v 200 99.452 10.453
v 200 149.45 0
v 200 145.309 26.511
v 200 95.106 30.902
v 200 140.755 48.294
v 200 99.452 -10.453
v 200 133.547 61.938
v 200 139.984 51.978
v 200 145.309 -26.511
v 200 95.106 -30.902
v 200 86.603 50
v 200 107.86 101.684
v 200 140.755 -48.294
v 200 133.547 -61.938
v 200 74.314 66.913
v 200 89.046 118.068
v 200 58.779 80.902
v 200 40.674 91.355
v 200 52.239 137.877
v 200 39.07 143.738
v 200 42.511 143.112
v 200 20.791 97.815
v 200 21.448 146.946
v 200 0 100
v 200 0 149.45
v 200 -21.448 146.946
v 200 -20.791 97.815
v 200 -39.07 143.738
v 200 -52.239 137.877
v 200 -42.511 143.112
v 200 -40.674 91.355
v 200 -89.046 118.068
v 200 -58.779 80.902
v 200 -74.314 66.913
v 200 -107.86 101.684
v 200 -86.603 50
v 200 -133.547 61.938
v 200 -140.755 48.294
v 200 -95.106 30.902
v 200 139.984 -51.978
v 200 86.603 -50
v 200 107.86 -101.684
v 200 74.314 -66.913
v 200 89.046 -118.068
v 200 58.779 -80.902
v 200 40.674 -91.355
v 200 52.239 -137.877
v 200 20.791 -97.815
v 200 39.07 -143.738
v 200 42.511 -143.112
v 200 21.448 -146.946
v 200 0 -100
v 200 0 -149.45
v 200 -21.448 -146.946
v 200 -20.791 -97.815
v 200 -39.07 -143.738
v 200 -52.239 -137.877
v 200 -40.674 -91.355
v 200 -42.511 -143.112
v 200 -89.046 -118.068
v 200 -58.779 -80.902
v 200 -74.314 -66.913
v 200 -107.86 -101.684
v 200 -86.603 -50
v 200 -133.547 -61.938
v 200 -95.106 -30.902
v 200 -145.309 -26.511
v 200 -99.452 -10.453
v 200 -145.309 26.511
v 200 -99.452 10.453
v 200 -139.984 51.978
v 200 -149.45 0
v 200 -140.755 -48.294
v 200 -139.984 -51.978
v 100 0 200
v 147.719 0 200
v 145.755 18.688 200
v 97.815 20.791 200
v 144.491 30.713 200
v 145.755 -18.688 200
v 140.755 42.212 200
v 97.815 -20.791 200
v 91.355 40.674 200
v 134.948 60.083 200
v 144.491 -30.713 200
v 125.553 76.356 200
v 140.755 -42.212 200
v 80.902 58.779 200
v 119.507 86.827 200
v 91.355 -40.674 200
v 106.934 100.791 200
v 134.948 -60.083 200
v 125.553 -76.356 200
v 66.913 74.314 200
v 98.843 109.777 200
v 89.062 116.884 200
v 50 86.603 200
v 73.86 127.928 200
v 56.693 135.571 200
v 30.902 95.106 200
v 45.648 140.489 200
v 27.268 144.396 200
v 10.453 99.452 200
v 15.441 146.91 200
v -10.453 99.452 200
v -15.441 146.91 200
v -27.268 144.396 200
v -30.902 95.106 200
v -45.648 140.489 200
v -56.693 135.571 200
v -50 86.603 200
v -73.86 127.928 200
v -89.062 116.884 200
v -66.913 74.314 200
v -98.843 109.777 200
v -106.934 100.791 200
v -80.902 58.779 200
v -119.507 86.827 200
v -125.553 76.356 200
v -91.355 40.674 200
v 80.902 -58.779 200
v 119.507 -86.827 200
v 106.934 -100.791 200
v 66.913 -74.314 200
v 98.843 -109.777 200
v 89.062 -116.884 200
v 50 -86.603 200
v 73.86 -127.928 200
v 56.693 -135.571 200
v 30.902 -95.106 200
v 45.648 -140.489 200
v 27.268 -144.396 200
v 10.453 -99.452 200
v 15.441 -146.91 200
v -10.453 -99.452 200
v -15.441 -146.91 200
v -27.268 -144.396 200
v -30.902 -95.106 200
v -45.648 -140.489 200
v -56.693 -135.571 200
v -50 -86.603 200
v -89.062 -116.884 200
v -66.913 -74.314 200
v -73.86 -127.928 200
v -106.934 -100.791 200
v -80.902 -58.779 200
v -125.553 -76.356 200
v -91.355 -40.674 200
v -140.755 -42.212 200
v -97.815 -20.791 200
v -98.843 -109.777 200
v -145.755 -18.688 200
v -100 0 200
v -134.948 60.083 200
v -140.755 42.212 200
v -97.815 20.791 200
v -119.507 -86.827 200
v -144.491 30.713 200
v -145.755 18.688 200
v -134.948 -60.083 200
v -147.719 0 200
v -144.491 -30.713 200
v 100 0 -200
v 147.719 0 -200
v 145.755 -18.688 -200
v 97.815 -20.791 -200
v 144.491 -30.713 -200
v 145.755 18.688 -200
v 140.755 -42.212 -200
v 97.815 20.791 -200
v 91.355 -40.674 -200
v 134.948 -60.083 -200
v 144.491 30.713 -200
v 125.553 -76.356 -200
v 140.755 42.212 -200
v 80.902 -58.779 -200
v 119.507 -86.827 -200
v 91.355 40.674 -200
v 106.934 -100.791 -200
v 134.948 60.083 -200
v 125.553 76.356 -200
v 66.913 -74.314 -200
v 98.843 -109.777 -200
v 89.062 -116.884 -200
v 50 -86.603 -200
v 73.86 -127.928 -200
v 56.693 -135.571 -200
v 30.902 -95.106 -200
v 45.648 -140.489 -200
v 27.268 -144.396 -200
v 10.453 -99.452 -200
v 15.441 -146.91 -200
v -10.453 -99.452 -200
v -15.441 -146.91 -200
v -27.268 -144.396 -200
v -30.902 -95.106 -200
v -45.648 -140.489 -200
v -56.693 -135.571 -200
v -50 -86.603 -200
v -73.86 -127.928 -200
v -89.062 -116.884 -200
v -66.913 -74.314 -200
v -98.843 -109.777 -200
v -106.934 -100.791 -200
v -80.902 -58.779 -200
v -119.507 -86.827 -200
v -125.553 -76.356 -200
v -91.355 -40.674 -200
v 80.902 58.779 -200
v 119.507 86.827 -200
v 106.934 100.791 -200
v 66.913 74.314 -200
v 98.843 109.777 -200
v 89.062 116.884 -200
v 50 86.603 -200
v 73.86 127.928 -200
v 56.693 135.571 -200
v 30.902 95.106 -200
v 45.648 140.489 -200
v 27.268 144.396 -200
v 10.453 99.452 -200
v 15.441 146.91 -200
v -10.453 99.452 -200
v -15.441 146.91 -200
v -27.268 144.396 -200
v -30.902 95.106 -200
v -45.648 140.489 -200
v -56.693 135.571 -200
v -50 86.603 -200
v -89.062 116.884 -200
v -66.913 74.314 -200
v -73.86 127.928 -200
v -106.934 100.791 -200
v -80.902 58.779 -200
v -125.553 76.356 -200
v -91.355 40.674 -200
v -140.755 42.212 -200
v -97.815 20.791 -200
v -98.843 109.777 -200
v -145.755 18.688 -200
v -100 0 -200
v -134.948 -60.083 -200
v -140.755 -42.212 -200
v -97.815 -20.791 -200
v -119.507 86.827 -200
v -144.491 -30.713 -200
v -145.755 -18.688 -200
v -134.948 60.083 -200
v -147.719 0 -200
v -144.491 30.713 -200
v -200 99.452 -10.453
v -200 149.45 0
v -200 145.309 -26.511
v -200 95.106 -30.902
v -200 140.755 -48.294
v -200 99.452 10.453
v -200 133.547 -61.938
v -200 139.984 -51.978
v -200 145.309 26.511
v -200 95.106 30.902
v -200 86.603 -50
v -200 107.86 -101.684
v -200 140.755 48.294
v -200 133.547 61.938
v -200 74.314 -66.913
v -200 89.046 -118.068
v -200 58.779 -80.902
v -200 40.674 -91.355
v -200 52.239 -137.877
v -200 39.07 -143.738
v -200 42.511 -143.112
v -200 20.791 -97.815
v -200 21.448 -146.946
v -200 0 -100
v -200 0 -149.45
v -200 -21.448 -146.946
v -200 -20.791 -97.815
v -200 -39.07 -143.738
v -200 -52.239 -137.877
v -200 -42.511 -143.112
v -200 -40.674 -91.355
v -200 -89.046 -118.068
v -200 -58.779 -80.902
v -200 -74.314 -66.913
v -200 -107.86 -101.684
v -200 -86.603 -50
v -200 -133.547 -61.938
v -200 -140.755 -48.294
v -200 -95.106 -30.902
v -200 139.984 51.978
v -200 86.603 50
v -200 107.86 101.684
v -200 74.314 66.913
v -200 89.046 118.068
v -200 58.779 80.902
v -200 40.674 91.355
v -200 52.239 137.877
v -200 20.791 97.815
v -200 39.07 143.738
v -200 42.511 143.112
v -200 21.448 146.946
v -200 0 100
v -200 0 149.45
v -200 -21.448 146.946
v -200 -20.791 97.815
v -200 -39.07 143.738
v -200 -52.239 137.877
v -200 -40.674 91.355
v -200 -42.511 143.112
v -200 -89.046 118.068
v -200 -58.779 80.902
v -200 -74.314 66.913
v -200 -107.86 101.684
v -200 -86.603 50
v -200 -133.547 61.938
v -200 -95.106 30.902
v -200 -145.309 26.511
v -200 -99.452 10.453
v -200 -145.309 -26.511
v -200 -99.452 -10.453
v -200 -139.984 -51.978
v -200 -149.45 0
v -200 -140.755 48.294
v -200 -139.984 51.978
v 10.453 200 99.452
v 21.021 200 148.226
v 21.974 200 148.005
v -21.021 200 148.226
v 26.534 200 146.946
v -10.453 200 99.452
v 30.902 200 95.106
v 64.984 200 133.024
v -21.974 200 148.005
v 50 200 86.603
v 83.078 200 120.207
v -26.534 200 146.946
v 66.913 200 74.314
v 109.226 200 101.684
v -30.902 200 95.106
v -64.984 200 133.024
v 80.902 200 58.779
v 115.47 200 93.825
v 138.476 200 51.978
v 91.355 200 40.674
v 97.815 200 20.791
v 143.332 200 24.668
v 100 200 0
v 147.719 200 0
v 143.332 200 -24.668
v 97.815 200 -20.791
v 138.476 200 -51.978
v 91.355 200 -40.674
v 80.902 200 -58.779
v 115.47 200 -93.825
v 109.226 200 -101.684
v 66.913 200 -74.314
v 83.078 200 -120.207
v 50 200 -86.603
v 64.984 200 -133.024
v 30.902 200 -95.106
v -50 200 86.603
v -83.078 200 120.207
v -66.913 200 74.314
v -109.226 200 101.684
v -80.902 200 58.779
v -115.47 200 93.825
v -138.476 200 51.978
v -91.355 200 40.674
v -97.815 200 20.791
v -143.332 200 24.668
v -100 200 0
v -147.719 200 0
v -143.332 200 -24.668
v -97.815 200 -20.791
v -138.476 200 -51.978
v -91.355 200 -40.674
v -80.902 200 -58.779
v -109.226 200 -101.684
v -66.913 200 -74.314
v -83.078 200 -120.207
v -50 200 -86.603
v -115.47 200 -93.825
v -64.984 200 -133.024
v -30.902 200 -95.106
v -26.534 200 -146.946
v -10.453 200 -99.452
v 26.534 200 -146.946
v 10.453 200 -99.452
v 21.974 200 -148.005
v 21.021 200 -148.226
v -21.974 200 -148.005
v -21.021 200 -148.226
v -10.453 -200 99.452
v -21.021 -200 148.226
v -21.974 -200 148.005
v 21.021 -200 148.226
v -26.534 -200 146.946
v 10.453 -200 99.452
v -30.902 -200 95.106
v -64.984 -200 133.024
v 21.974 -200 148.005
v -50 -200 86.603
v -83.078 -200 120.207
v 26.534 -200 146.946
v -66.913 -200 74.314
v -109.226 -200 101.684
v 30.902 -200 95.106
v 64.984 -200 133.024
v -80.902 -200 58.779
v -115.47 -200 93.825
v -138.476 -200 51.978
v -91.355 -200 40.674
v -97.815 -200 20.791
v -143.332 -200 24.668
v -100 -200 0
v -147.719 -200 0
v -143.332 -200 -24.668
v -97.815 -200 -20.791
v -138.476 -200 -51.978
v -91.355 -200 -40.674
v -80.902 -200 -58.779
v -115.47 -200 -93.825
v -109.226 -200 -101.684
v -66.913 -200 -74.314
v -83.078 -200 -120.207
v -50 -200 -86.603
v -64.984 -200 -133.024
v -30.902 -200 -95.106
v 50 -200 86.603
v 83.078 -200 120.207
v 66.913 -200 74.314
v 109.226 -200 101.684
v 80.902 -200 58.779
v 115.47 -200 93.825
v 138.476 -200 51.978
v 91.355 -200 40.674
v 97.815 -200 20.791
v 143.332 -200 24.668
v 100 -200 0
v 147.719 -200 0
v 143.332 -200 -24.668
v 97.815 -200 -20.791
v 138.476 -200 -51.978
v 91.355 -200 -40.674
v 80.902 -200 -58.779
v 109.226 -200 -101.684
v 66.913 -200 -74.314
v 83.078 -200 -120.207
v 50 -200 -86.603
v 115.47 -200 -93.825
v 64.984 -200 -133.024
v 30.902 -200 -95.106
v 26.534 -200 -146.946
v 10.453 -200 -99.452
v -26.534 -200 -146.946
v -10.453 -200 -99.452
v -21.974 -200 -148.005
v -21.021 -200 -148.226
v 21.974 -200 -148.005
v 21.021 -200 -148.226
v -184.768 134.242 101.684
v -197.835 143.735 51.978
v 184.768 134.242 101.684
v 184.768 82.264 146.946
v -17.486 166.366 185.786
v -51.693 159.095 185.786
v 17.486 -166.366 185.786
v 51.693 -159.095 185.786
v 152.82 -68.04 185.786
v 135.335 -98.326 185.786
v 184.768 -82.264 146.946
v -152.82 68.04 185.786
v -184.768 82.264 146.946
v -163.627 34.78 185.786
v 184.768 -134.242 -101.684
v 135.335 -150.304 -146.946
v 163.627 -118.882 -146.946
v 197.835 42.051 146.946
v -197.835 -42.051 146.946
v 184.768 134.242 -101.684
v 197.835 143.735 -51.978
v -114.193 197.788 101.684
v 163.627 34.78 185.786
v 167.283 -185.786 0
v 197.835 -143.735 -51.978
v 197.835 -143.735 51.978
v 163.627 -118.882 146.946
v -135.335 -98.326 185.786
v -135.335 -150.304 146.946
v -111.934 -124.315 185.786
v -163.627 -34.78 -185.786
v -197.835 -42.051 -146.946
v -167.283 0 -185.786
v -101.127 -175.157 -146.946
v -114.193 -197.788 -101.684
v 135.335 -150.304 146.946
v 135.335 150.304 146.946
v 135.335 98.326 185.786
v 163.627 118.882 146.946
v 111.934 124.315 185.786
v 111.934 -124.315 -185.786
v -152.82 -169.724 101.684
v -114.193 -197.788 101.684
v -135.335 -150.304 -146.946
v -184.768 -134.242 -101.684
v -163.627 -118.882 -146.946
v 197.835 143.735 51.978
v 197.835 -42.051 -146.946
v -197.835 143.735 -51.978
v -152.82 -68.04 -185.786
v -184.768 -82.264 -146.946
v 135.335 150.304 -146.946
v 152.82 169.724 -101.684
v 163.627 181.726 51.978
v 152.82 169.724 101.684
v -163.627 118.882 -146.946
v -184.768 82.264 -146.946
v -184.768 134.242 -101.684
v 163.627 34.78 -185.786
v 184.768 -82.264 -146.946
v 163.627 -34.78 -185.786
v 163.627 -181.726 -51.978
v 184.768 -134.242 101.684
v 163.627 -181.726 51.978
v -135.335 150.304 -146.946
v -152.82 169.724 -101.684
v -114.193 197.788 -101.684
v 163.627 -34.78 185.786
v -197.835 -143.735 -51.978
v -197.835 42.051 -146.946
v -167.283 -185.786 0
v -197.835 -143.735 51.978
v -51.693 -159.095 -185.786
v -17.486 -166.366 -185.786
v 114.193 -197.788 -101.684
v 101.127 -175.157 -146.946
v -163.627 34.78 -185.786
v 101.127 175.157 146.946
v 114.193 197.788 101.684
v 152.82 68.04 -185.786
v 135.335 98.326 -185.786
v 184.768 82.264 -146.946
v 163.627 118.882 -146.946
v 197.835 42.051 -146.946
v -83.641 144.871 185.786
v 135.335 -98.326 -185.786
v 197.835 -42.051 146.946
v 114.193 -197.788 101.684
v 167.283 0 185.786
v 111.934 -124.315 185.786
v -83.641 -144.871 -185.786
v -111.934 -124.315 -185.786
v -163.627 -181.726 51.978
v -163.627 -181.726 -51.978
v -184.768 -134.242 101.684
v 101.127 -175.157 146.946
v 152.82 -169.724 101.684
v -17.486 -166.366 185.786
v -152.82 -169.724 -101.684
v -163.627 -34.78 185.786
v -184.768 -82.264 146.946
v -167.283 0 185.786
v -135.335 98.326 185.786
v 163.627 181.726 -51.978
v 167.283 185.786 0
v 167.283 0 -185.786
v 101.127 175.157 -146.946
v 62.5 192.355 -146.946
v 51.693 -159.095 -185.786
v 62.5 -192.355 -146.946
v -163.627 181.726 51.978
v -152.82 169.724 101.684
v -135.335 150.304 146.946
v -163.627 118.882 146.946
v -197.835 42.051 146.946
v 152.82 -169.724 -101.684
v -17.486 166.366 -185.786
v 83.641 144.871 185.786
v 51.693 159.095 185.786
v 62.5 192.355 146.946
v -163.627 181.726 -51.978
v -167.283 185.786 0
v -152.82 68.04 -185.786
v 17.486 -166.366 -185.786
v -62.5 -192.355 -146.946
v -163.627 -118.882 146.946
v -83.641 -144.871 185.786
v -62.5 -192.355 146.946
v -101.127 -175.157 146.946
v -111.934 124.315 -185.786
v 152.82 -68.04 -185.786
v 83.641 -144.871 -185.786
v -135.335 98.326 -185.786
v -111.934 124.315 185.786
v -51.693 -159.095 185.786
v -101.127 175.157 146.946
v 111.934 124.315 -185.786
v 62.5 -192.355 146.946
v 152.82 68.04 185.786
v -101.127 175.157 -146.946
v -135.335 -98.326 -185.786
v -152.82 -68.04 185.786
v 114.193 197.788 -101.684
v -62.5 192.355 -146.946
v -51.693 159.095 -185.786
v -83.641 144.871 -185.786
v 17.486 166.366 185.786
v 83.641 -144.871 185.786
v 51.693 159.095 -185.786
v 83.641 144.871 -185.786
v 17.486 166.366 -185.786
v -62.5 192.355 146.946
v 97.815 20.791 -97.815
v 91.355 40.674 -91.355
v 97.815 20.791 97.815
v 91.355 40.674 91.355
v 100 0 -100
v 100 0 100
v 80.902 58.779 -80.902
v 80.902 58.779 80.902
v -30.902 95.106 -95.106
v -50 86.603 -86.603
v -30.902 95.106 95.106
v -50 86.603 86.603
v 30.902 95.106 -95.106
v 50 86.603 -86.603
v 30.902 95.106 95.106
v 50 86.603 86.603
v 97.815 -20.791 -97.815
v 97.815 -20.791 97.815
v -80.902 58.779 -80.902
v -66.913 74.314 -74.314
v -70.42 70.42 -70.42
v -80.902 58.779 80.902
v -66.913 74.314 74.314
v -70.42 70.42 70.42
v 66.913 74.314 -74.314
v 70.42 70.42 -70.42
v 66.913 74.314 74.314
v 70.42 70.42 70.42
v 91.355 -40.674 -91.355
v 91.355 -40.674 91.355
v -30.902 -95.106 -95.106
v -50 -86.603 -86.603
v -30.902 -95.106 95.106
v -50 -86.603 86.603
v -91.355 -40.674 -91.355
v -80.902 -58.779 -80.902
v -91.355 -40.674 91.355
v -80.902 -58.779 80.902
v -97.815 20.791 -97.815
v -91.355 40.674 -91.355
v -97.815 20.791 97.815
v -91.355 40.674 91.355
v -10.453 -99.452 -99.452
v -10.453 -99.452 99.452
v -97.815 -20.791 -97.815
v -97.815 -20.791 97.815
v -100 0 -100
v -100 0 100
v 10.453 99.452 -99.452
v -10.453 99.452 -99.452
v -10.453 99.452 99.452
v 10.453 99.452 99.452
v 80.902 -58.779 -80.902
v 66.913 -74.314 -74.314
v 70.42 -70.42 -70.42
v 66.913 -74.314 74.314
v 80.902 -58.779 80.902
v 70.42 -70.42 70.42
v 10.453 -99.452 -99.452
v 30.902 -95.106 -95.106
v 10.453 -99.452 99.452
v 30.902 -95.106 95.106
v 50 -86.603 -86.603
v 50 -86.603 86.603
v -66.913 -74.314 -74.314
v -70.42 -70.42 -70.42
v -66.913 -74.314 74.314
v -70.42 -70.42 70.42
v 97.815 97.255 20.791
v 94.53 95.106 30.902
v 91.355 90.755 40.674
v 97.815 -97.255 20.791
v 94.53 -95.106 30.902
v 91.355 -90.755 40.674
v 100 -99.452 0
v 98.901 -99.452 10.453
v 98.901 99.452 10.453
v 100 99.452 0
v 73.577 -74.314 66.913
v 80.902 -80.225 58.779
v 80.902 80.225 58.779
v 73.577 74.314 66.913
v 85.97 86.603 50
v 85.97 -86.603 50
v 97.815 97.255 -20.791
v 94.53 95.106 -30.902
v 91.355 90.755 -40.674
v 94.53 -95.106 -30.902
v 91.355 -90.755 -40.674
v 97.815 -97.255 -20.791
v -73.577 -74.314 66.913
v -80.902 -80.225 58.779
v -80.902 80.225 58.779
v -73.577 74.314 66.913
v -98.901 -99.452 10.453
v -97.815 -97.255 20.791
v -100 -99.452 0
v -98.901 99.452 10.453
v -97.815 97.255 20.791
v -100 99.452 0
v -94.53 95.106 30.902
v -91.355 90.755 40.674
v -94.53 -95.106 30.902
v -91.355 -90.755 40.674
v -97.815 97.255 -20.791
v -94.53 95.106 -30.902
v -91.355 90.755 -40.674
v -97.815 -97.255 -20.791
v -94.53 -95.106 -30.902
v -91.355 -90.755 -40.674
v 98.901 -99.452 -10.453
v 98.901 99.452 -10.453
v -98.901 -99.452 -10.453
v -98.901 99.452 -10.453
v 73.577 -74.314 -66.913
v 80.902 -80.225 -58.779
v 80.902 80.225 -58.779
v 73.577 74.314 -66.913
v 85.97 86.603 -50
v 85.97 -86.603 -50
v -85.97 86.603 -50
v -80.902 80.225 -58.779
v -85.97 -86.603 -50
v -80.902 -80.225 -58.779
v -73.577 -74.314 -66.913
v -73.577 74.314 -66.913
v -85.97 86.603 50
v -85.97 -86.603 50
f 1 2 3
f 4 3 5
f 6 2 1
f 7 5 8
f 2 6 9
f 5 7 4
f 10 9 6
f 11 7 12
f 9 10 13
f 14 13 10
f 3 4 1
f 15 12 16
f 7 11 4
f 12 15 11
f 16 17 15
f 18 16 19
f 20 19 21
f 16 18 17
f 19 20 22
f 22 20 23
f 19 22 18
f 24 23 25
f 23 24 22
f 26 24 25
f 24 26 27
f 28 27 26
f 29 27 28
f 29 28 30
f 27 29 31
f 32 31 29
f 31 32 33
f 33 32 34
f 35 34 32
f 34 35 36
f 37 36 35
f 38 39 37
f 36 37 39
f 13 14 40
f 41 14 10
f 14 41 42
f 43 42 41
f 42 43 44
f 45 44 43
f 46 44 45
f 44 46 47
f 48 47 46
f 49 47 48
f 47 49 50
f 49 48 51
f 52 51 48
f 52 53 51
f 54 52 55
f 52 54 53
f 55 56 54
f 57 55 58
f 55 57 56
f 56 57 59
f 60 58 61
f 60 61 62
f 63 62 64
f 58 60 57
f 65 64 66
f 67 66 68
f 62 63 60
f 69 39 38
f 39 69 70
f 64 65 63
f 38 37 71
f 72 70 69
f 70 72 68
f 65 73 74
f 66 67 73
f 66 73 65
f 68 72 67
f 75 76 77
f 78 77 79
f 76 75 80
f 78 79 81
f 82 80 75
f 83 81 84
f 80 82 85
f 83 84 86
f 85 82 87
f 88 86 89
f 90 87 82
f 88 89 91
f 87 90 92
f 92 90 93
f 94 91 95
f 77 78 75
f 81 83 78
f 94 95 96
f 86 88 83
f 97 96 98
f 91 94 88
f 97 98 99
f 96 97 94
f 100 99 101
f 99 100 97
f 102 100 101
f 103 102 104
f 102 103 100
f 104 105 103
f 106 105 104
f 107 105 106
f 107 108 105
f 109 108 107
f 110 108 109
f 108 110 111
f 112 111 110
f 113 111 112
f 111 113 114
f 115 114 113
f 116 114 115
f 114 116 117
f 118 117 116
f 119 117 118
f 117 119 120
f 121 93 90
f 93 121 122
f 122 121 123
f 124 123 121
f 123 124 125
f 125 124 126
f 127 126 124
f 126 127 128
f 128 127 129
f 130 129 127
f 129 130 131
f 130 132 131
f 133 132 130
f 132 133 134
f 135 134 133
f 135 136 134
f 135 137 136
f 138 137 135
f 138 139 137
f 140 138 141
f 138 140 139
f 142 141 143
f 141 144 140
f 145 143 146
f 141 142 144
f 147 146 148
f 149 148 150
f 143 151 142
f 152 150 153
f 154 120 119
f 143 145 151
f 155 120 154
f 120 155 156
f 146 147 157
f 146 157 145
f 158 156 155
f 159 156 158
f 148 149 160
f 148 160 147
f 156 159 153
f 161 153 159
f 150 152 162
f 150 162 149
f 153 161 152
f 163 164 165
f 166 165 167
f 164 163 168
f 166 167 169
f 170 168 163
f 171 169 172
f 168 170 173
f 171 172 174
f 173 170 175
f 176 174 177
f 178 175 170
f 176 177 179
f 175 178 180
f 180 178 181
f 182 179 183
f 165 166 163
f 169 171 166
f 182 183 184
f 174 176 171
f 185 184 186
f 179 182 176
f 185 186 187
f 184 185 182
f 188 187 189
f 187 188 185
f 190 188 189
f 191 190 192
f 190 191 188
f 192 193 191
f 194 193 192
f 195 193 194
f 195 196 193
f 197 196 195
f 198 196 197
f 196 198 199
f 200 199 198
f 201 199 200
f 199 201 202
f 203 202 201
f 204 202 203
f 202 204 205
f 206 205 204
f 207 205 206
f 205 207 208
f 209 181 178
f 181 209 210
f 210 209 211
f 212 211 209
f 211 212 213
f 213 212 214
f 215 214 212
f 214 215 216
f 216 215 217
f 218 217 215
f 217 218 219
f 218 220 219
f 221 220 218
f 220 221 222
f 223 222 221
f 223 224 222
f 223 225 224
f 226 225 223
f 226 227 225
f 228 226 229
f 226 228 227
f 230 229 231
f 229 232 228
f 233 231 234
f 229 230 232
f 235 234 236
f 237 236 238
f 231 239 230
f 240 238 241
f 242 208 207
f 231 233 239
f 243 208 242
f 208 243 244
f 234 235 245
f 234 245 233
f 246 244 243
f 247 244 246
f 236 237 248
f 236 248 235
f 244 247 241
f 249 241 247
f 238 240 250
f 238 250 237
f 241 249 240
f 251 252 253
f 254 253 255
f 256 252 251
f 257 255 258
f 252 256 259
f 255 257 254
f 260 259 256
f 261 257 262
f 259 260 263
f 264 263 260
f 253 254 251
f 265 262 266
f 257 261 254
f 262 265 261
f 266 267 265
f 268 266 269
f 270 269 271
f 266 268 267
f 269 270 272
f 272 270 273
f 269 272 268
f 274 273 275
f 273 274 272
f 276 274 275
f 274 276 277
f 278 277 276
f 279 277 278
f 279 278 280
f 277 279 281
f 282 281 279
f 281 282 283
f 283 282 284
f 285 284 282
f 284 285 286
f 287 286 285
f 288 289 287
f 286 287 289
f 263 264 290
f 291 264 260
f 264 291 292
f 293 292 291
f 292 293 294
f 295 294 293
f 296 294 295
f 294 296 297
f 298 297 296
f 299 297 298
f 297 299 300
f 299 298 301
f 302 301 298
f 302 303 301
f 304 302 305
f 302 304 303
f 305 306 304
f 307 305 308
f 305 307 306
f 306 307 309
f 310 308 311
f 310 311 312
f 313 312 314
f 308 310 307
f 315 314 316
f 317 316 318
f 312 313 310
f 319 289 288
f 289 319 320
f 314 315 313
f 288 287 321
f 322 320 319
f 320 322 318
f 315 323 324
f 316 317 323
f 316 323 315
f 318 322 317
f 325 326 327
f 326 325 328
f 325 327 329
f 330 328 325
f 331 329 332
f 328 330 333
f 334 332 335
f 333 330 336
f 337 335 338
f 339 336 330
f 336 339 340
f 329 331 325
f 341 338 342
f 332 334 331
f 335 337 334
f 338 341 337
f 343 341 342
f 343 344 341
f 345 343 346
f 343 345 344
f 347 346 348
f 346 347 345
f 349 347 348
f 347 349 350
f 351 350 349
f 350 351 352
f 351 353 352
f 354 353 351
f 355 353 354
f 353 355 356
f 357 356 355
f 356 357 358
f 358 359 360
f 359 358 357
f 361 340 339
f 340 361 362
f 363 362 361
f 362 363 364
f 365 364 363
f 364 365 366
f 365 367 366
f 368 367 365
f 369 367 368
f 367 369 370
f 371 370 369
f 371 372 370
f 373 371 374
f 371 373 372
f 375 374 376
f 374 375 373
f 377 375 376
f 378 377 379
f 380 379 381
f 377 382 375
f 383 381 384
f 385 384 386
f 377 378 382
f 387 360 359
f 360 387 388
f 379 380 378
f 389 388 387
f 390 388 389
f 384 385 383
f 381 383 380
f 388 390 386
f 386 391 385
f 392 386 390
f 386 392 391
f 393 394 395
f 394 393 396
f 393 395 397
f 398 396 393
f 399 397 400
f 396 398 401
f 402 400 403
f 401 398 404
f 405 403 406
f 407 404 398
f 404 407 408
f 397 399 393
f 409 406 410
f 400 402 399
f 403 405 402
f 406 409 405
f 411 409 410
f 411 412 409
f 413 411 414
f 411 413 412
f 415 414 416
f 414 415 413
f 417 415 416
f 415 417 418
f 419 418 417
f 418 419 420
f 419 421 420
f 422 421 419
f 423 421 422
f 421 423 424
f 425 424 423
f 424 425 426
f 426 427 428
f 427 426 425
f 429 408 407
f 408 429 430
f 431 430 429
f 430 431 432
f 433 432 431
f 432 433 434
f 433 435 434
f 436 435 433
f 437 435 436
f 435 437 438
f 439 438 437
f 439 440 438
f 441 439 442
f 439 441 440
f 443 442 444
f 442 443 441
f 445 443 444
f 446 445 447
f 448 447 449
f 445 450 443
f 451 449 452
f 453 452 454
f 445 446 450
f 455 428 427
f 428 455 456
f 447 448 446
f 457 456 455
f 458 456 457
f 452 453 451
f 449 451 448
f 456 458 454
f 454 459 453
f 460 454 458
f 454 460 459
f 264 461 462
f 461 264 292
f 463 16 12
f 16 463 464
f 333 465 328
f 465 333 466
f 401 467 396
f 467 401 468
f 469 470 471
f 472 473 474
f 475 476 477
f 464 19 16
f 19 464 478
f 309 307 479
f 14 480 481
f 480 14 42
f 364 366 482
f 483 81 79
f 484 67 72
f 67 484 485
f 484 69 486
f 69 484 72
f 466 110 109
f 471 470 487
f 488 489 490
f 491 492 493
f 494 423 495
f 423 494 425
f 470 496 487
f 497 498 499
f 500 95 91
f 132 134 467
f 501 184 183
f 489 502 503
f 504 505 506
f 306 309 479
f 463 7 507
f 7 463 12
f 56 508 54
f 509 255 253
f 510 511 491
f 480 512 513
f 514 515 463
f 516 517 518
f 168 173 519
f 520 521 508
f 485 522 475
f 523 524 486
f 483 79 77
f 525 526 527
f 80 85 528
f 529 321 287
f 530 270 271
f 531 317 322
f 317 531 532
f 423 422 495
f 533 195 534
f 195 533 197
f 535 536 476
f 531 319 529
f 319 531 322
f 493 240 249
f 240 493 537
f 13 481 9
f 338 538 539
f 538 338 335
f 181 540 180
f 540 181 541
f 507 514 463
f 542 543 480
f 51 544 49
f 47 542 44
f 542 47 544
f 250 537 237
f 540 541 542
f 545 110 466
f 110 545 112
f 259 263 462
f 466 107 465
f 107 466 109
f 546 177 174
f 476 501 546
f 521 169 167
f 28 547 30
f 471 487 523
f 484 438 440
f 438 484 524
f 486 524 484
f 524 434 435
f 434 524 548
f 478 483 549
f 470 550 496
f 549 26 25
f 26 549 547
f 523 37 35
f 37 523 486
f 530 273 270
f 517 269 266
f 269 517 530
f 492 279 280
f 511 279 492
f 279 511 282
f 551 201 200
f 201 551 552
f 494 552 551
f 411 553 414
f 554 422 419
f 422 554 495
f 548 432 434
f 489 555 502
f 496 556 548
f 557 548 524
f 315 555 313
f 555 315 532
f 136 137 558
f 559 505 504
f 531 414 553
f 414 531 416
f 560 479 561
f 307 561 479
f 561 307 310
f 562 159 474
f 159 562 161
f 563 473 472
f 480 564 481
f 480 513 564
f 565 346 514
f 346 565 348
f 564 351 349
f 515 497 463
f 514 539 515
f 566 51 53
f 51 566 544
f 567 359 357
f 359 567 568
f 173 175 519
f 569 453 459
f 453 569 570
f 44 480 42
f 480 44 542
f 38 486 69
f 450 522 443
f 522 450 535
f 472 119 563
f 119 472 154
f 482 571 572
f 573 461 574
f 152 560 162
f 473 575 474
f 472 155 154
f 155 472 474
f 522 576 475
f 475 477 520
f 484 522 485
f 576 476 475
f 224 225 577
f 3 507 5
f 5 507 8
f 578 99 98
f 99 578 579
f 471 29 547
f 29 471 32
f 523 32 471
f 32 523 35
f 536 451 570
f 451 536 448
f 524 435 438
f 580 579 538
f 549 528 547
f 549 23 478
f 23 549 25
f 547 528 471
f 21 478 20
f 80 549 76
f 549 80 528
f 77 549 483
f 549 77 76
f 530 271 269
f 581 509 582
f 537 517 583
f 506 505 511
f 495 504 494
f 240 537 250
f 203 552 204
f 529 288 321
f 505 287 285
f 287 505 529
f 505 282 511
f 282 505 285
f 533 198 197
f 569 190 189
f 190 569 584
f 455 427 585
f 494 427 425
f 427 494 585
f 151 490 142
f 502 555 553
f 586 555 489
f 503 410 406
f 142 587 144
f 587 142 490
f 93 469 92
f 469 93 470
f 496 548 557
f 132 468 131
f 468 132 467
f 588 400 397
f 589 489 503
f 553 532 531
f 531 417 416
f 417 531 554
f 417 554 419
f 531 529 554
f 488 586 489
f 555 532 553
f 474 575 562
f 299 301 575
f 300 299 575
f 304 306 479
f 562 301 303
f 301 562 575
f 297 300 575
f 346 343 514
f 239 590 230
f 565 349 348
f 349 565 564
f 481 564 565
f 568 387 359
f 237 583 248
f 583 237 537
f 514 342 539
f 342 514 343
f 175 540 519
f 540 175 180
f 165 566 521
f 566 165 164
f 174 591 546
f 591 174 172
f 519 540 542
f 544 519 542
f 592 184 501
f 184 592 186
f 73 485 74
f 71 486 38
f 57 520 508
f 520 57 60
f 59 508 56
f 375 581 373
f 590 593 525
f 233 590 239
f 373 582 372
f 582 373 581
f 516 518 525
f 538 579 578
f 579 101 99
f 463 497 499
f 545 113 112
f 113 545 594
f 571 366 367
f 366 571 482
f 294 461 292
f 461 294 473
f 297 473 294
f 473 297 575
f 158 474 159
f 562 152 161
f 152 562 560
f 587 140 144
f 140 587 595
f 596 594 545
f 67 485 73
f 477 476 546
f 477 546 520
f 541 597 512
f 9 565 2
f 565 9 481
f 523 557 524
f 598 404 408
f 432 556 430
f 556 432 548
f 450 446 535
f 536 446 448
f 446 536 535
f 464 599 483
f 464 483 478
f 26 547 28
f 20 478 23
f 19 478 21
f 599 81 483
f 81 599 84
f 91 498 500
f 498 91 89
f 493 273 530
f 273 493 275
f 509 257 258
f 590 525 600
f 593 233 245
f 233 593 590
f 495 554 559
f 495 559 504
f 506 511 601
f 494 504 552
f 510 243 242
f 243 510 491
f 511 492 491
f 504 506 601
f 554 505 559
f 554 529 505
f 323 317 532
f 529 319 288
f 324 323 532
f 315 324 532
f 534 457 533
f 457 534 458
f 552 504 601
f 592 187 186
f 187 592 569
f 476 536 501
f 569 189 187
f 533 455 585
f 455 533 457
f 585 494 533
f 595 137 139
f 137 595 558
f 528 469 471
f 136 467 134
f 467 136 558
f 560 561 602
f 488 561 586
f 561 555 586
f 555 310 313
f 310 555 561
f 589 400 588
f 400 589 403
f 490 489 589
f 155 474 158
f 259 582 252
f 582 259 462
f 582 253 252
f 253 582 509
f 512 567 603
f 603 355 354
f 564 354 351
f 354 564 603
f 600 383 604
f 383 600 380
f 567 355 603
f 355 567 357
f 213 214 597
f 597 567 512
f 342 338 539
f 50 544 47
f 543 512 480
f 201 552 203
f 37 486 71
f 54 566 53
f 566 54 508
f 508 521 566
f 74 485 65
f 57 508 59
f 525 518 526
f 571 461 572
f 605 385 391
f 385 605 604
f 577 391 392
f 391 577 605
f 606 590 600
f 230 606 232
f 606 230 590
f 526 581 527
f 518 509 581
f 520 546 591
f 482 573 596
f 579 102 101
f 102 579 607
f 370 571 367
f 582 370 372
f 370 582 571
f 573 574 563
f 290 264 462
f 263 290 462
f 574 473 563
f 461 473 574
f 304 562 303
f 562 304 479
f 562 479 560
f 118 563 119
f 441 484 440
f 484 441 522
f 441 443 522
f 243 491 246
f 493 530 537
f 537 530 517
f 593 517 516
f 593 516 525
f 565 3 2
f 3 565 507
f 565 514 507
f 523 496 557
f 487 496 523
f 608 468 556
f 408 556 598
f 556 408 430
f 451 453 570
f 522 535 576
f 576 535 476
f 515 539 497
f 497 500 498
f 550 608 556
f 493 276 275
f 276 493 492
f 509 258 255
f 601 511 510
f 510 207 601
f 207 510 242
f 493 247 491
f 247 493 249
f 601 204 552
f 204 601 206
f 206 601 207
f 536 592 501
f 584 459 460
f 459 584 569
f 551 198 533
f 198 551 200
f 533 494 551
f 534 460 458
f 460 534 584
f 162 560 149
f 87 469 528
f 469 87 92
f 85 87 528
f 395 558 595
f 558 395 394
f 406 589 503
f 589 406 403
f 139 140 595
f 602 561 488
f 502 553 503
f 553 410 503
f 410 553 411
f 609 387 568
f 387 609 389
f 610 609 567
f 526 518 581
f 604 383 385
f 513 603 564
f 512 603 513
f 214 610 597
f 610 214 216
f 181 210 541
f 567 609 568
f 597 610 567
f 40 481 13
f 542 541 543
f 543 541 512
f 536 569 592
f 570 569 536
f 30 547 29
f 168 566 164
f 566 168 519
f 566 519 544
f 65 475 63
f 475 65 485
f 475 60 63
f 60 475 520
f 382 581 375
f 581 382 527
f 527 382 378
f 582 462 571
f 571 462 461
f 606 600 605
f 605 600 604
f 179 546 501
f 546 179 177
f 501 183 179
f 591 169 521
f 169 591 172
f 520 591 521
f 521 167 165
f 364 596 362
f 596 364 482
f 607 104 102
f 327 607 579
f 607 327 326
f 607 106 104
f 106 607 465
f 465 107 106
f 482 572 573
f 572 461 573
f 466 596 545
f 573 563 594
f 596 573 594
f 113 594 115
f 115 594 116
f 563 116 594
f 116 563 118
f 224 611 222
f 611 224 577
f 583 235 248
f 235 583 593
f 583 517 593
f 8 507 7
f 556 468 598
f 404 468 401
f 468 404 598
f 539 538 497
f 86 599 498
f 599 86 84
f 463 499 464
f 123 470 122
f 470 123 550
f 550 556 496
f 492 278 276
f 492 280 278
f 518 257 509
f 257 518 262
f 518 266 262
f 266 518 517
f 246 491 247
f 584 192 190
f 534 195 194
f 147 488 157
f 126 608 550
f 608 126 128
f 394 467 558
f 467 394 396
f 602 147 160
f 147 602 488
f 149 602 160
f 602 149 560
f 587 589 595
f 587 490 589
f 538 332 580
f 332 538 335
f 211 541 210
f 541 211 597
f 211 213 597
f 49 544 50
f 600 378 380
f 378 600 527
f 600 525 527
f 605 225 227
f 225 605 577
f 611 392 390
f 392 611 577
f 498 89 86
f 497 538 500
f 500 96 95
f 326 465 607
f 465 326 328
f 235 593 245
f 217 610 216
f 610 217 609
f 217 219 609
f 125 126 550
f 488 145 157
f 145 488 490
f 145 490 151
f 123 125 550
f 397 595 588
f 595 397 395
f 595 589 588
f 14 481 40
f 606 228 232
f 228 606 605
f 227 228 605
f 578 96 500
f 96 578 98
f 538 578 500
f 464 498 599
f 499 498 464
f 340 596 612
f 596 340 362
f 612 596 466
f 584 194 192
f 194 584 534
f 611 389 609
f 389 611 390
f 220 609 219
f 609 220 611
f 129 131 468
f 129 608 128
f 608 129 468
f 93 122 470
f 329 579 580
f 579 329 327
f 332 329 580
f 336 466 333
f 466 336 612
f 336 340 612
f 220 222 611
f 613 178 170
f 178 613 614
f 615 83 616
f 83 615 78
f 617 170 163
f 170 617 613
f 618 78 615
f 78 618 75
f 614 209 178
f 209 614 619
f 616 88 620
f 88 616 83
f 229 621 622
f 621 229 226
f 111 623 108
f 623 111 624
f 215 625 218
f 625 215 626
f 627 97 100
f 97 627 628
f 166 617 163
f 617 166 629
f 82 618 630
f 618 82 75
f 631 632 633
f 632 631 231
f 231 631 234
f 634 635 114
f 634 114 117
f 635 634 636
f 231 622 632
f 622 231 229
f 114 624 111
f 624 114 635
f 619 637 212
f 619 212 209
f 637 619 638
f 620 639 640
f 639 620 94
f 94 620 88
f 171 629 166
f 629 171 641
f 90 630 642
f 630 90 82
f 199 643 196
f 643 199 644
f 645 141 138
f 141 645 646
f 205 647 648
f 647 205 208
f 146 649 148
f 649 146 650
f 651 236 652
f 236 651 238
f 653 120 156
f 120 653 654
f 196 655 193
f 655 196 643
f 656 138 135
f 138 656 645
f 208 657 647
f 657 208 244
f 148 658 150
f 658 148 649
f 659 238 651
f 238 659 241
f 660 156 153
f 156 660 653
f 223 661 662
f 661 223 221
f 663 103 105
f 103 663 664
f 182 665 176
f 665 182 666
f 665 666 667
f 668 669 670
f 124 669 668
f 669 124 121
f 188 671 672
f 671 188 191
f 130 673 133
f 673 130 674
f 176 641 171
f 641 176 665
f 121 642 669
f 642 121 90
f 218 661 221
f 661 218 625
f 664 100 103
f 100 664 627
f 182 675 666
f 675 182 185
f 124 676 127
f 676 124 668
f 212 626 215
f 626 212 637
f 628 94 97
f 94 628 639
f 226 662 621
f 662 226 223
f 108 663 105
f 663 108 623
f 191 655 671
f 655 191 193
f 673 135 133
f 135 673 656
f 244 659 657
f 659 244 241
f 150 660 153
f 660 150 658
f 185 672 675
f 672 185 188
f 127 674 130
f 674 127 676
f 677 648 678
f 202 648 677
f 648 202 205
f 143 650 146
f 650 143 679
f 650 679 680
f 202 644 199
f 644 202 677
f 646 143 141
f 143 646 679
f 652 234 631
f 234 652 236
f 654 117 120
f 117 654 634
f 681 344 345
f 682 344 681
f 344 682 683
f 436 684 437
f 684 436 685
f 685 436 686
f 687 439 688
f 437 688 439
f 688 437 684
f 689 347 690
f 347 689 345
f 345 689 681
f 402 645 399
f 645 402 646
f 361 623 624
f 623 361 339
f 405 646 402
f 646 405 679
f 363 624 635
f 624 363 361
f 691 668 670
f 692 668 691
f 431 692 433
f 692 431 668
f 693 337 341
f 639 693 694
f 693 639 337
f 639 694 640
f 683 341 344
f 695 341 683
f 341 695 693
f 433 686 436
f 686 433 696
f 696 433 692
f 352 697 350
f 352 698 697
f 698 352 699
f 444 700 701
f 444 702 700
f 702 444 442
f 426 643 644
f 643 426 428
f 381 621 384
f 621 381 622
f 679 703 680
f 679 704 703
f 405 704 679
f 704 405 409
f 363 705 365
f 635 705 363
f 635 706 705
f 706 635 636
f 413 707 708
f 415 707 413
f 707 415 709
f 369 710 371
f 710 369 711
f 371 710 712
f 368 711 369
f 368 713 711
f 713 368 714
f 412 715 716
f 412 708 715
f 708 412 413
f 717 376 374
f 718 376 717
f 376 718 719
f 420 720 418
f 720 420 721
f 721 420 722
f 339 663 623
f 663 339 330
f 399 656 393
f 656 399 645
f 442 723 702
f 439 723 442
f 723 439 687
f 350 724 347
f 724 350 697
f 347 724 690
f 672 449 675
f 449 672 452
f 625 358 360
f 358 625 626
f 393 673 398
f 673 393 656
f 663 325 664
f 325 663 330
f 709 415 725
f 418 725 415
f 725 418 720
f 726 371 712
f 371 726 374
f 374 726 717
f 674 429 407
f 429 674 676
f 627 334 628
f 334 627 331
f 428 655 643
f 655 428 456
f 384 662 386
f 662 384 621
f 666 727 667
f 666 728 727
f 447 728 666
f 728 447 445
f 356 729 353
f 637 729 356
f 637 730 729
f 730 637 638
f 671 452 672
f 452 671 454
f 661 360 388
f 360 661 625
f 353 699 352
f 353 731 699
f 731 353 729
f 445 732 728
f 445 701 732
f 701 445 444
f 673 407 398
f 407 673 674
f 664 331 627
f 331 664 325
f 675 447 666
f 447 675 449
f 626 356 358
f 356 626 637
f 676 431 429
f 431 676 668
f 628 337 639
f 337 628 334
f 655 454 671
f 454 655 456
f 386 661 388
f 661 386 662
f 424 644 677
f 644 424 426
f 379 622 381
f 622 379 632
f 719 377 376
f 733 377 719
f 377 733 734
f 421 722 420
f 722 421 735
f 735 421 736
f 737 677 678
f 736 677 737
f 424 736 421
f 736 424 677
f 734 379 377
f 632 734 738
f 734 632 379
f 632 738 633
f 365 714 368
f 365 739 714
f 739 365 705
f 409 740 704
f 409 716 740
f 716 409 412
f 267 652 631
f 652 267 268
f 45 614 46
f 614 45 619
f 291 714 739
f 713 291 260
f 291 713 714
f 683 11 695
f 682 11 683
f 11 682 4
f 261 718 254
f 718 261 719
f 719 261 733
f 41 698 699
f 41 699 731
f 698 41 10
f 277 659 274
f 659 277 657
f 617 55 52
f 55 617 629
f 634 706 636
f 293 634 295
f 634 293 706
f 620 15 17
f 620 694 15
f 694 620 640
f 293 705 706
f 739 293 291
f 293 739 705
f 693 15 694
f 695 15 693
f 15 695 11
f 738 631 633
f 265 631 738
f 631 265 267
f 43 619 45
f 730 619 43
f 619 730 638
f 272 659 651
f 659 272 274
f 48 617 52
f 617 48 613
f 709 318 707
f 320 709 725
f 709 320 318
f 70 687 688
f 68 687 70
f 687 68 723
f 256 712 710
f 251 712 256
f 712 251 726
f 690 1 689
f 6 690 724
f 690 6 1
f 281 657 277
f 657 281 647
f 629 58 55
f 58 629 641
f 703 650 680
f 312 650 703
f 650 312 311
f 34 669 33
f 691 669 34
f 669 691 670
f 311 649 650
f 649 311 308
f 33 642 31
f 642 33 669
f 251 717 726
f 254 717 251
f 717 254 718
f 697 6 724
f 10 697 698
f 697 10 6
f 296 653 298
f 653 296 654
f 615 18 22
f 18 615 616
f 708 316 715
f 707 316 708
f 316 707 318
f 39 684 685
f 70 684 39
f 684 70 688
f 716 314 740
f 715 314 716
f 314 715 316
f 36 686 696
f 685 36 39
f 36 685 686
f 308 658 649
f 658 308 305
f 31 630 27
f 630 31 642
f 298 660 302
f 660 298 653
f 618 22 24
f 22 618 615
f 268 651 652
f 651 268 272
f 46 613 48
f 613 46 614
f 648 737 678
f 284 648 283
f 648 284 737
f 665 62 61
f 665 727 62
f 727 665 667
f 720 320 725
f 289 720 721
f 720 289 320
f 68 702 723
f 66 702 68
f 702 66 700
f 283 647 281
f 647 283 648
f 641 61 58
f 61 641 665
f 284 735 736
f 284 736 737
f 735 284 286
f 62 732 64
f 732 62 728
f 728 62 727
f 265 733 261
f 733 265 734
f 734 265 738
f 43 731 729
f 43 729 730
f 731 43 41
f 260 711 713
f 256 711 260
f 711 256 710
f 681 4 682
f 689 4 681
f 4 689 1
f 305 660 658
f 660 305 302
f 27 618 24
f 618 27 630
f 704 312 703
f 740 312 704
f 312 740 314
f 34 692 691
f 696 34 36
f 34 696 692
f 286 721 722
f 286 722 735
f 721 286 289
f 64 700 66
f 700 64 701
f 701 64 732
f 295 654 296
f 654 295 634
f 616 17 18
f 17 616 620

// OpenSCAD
//cylinder(r1=40,r2=0,h=30);
//for (i=[1:10])
//    translate([20*i,0,0]) {
//        cylinder(r=5,h=25);
//        difference() {
//            sphere(20);
//            translate([0,0,-25])
//            cylinder(r=5,h=10);
//        }
//    }

a = 100;

difference() {
    intersection() {
        cube( size=4*a, center=true );
        sphere( r = 2.5*a );
    }
    union() {
            cylinder( r=a, h=5*a, center=true );
        rotate ([90,0,0])
            cylinder( r=a, h=5*a, center=true );
        rotate ([0,90,0])
            cylinder( r=a, h=5*a, center=true );
    }
}
